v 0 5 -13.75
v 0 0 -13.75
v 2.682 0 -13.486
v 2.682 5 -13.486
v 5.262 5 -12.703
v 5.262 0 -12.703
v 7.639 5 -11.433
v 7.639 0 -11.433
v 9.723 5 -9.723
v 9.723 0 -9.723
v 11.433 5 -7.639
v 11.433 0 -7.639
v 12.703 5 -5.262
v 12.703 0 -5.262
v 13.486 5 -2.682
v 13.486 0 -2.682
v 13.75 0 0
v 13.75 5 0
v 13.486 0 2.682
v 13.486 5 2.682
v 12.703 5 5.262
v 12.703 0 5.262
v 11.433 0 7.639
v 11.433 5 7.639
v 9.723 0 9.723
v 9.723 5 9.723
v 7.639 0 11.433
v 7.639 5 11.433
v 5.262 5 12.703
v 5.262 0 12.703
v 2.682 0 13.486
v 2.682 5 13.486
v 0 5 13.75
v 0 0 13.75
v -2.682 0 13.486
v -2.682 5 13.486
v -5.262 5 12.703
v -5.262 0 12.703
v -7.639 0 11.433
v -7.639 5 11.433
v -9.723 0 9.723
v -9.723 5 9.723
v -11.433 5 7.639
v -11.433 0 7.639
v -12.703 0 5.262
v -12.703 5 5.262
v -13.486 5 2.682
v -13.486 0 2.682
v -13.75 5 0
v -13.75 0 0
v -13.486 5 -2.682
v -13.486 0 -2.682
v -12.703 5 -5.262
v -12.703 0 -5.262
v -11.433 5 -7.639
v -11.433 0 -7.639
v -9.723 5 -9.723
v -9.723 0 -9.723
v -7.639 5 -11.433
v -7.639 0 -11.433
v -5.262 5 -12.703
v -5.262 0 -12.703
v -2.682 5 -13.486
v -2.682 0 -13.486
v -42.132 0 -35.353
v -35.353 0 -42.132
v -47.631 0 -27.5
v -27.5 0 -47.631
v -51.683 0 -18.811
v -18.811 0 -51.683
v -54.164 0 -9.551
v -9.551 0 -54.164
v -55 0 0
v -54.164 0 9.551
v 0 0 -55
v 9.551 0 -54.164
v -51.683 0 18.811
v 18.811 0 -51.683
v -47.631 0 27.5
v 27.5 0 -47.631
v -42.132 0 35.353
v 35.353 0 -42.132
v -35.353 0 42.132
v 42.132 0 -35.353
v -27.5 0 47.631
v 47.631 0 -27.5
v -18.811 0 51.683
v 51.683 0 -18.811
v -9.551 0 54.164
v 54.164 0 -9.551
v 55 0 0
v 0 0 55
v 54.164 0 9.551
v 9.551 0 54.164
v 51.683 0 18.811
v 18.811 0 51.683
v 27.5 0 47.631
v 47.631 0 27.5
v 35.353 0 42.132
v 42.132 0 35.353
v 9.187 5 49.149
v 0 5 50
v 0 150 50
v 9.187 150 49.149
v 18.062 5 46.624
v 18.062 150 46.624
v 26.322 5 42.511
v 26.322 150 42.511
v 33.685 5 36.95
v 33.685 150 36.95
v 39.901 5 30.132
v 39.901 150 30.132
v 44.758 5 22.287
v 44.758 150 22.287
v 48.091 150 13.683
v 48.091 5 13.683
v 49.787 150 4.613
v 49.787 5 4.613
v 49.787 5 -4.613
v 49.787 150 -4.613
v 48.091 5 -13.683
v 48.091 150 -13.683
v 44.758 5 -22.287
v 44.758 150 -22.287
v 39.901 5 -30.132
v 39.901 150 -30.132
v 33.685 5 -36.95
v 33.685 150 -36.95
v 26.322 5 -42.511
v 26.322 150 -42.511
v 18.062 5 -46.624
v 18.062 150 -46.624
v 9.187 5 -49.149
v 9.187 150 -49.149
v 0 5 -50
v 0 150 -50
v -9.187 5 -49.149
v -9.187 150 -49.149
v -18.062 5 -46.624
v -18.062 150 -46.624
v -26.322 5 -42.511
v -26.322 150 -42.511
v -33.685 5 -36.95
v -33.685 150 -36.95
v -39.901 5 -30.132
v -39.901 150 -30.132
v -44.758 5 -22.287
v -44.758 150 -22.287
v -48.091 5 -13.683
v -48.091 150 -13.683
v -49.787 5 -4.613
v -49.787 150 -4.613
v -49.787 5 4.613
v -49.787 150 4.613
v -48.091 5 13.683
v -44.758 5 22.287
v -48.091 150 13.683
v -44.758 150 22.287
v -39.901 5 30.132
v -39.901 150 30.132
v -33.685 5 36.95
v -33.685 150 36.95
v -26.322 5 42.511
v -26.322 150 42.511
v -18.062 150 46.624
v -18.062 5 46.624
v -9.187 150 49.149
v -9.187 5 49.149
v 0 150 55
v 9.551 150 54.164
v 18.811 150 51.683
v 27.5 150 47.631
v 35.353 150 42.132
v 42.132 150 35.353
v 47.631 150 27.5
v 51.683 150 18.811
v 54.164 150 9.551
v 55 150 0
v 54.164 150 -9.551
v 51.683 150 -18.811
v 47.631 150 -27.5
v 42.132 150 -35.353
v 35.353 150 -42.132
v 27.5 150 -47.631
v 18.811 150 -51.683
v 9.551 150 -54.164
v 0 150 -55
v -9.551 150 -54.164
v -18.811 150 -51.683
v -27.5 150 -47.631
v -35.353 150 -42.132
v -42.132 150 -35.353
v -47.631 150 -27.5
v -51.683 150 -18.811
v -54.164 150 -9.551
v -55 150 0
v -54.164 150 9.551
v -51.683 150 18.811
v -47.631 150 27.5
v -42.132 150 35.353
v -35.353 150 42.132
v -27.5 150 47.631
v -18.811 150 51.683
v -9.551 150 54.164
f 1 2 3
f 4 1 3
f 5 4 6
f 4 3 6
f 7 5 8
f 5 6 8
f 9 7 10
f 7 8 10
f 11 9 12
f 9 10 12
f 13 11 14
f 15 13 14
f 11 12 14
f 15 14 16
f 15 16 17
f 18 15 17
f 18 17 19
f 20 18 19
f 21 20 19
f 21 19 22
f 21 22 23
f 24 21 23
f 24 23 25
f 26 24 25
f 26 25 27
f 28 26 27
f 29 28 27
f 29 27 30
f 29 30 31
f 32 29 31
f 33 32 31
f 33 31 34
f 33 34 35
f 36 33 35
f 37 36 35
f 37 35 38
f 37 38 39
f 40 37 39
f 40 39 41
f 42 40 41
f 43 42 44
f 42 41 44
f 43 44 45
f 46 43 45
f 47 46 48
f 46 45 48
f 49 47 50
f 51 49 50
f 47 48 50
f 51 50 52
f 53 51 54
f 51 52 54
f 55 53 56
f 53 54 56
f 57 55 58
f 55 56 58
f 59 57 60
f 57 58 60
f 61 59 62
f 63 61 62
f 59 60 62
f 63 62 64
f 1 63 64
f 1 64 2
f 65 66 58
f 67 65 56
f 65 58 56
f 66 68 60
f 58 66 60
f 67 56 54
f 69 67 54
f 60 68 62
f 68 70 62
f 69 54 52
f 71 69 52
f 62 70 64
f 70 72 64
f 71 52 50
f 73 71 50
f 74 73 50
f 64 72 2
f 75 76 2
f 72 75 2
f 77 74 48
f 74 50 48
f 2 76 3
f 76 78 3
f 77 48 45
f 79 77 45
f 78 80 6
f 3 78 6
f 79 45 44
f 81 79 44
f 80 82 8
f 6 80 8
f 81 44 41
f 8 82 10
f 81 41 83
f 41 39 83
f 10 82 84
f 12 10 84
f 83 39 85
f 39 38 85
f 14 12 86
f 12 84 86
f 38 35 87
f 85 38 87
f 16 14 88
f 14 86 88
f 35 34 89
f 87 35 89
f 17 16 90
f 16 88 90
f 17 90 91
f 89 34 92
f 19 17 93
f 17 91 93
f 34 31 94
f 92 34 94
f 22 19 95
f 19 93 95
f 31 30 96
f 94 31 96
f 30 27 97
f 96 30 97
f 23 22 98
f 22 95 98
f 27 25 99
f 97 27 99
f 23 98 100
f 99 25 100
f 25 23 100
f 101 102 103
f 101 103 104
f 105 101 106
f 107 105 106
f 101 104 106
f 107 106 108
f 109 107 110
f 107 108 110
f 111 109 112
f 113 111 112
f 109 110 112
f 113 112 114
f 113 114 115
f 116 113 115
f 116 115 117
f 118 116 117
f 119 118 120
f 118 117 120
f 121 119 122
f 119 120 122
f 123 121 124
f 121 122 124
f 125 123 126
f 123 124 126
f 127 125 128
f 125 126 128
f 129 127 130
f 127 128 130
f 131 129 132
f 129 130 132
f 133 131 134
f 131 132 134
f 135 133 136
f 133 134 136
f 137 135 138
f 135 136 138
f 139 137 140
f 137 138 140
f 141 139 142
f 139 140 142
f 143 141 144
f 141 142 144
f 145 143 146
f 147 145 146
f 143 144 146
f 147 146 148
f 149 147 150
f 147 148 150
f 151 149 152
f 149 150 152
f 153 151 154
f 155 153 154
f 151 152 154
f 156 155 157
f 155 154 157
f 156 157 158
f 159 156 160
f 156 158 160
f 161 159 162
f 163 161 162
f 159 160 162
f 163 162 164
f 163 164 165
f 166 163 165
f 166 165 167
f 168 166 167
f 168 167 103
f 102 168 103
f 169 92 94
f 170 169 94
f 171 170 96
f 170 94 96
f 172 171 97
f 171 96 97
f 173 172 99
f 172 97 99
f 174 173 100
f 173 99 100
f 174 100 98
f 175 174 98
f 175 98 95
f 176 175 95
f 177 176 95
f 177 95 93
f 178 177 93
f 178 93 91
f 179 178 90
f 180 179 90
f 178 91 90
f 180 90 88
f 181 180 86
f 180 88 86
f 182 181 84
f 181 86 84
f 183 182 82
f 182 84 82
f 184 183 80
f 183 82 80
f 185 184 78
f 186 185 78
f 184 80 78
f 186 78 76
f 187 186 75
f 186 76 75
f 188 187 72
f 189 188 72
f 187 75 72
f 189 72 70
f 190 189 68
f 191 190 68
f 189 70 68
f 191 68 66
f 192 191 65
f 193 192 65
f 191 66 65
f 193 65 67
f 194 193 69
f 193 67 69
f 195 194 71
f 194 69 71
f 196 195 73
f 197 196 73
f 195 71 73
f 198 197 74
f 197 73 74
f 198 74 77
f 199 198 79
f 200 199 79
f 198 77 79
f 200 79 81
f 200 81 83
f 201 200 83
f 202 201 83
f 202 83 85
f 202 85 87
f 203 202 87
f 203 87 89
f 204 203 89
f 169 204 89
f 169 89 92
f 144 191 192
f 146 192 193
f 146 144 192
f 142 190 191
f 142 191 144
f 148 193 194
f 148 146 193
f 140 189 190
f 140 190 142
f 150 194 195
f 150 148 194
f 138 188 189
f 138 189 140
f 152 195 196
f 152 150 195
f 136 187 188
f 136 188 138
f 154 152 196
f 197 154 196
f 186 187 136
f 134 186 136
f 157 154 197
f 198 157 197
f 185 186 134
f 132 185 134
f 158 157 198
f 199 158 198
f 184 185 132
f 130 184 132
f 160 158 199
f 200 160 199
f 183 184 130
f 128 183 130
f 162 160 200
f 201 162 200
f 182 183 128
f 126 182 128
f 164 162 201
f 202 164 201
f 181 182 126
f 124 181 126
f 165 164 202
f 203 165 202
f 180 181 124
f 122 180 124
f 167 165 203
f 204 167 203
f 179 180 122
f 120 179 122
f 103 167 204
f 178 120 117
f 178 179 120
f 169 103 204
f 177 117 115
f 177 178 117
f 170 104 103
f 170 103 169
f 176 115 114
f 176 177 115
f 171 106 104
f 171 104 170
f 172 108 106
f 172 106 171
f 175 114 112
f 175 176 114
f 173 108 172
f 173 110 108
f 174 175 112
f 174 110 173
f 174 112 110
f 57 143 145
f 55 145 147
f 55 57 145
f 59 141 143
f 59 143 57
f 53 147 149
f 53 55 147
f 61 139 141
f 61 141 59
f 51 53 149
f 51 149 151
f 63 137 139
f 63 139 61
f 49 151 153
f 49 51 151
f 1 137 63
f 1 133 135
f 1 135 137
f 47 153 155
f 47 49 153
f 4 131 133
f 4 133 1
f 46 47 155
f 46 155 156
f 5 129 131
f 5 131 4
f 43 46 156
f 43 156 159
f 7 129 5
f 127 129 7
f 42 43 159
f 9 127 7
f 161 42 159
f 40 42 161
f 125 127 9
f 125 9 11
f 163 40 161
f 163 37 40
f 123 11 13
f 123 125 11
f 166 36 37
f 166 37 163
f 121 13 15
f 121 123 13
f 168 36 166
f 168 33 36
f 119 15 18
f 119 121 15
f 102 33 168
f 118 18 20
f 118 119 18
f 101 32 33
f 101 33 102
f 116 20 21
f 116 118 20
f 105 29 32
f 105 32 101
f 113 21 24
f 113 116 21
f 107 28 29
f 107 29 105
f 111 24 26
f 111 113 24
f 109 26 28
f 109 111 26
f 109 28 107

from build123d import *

# Parameters (mm, degrees)
SKETCH_1_R          = 55
EXTRUDE_1_DEPTH     = 150
SKETCH_2_R          = 50
CUT_EXTRUDE_1_DEPTH = 145
SKETCH_3_R          = 13.75
CUT_EXTRUDE_2_DEPTH = 169.967452487


with BuildPart() as part:
    # 草图1 → 拉伸1 (new body)
    with BuildSketch(Plane(origin=(0, 0, 0), x_dir=(1, 0, 0), z_dir=(0, 1, 0))):
        with Locations(Location((0, 0, 0), (0, 0, 270))):
            Circle(SKETCH_1_R)
    extrude(amount=EXTRUDE_1_DEPTH)

    # 草图2 → 切除-拉伸1 (cut)
    with BuildSketch(Plane(origin=(0, 150, 0), x_dir=(-1, 0, 0), z_dir=(0, 1, 0))):
        with Locations(Location((0, 0, 0), (0, 0, 90))):
            Circle(SKETCH_2_R)
    extrude(amount=-CUT_EXTRUDE_1_DEPTH, mode=Mode.SUBTRACT)

    # 草图3 → 切除-拉伸2 (cut, through all)
    with BuildSketch(Plane.XZ):
        with Locations(Location((0, 0, 0), (0, 0, 270))):
            Circle(SKETCH_3_R)
    extrude(amount=-CUT_EXTRUDE_2_DEPTH, mode=Mode.SUBTRACT)


solid = part.part
